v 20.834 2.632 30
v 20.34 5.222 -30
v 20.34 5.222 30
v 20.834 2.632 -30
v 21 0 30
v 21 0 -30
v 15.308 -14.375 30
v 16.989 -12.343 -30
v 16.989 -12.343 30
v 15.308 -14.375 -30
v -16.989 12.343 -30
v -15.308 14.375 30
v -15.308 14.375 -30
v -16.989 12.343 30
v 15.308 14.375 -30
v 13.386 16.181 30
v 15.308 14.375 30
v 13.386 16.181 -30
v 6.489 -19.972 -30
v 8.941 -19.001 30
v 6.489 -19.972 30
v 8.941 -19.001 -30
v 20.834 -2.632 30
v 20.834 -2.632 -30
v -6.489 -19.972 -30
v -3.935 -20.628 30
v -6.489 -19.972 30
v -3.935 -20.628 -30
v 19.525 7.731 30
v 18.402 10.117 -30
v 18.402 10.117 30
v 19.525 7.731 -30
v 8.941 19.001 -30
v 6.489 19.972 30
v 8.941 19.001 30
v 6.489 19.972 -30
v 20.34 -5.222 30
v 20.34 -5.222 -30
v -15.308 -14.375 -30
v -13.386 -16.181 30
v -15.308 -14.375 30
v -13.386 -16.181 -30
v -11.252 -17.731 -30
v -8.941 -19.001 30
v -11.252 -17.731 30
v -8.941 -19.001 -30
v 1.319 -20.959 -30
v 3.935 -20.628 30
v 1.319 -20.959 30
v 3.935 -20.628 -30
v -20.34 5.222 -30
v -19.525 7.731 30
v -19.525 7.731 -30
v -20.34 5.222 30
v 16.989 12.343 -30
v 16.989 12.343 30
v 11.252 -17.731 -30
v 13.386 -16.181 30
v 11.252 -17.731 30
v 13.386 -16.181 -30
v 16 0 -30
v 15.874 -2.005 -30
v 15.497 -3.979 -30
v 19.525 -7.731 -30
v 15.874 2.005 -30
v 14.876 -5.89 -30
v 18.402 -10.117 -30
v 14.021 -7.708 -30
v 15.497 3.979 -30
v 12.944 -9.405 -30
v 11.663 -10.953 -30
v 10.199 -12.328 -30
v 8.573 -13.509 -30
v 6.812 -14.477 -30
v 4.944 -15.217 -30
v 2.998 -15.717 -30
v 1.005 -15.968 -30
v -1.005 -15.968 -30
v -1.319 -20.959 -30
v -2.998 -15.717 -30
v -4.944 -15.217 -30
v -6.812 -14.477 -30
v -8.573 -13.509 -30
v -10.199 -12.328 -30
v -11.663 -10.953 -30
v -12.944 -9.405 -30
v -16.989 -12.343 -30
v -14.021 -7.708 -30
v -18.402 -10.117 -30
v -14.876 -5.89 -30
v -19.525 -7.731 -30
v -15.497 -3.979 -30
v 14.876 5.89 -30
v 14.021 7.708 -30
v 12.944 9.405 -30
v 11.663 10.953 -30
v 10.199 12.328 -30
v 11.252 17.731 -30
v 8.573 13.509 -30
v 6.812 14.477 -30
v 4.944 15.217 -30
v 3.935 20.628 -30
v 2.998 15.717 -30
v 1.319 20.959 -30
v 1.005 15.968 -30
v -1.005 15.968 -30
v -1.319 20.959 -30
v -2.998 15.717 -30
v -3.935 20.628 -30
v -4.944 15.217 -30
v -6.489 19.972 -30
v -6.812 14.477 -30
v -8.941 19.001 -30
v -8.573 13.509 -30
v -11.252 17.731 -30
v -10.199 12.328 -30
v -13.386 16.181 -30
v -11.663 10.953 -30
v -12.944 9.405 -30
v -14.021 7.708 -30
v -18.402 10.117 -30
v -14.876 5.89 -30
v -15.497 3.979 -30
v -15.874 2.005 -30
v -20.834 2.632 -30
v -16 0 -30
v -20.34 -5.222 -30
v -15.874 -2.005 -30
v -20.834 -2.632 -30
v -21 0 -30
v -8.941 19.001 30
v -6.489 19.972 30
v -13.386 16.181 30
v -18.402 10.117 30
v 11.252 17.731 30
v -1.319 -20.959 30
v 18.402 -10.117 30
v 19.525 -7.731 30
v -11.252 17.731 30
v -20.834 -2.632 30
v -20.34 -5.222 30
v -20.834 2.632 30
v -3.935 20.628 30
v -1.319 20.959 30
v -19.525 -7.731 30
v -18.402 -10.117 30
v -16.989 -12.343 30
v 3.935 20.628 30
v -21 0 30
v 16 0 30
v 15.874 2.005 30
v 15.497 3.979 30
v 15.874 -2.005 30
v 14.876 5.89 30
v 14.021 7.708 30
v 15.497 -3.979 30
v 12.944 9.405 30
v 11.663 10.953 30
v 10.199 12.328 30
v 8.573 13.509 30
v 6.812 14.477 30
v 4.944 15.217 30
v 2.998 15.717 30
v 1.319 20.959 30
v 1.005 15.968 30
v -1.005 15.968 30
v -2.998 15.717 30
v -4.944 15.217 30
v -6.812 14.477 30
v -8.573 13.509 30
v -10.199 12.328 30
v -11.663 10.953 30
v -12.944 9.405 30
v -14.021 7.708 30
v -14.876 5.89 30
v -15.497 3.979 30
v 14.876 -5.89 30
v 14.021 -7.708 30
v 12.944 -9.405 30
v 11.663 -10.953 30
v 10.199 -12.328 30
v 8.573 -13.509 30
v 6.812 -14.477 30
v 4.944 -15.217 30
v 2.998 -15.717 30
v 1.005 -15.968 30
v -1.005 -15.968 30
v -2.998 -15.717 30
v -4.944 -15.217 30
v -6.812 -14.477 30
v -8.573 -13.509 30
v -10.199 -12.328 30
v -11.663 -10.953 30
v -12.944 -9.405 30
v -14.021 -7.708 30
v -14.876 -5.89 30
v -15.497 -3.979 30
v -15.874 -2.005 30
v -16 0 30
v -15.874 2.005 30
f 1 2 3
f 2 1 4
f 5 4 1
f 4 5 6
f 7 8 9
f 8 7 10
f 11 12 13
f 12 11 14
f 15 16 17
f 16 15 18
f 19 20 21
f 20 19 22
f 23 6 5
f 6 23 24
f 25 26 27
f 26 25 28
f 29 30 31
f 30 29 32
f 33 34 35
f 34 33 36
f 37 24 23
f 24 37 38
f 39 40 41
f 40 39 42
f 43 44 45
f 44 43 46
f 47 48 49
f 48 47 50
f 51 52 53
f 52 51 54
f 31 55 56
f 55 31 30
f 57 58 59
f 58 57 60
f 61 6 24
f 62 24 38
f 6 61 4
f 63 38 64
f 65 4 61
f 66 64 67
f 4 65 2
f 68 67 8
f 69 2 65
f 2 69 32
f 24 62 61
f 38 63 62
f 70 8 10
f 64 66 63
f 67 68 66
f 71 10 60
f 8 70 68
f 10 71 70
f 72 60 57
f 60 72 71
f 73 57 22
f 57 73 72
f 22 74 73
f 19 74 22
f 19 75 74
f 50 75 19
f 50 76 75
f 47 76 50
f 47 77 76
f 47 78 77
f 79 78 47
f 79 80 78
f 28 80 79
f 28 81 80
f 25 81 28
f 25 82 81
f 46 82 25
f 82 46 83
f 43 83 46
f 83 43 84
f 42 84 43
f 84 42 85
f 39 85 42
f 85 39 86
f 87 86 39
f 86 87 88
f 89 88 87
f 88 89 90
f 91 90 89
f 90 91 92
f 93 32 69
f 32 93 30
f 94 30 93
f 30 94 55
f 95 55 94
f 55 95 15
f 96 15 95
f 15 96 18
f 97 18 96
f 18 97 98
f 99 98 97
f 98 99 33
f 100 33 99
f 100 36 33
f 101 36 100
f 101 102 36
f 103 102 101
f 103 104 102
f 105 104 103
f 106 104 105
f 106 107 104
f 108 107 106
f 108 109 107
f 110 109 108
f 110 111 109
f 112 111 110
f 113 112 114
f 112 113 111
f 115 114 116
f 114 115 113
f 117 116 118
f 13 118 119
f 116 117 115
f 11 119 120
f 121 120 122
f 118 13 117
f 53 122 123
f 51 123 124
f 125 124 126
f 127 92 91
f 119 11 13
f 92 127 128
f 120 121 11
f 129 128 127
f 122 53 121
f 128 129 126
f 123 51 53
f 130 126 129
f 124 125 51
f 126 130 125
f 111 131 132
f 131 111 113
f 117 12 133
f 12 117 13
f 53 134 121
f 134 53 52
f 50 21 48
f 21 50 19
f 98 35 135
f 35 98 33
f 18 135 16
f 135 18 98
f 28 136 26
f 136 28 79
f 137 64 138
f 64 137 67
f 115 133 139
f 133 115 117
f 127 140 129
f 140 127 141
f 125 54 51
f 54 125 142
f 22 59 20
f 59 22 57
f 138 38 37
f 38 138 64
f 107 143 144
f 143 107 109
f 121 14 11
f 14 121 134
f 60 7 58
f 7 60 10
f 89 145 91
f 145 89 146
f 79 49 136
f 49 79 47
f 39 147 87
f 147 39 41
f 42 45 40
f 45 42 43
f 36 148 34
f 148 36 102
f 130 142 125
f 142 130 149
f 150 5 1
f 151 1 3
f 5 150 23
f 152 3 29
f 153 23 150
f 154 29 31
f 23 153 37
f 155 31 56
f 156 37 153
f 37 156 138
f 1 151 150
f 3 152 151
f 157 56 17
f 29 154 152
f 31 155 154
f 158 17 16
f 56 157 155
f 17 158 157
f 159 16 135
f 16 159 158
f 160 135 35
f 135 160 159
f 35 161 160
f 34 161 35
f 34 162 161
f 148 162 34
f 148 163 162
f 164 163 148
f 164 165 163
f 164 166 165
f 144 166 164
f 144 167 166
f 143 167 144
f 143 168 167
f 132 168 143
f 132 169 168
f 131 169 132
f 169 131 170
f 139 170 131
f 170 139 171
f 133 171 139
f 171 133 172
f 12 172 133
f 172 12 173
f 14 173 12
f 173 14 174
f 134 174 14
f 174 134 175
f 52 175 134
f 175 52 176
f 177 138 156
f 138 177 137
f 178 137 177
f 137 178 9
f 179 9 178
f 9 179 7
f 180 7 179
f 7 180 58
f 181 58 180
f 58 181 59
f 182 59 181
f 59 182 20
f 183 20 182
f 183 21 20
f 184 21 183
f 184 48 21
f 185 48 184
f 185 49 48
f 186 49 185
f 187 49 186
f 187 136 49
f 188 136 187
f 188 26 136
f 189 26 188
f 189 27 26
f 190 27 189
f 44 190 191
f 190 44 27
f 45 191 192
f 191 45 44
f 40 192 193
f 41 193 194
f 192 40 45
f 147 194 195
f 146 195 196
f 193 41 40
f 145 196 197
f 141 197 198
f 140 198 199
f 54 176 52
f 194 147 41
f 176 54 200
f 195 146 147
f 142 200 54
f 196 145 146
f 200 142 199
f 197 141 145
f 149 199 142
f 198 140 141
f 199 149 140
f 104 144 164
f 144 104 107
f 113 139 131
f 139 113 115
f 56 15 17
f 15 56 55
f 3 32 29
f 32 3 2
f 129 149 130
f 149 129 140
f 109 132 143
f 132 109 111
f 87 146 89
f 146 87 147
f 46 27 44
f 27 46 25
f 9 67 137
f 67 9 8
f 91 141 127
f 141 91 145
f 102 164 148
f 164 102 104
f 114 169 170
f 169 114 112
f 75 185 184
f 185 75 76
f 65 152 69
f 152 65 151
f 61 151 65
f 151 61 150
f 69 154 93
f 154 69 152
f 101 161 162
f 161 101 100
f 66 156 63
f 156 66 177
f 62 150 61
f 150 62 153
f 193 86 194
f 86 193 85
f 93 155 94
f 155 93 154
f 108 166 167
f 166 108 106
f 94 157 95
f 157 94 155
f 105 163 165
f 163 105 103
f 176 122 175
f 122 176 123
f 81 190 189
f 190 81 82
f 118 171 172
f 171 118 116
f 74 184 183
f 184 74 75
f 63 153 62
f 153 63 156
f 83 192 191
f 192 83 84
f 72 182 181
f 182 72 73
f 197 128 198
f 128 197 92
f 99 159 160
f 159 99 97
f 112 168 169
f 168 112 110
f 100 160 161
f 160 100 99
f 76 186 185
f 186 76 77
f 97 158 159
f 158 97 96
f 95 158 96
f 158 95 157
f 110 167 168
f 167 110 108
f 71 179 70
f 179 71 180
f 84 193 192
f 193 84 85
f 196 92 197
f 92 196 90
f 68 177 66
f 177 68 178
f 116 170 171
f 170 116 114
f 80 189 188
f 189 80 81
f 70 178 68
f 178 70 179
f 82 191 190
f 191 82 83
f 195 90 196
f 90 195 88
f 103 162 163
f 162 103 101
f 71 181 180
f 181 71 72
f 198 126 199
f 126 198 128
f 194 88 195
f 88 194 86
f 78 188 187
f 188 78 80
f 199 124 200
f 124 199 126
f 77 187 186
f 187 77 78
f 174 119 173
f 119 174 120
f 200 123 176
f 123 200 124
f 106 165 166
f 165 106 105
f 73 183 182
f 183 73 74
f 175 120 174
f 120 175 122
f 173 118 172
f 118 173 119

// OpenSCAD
// file: ../config/parameters.scad
// Global Chassis Dimensions
chassis_width = 720; //kies een veelvoud van 80  
chassis_length = 1040; //kies een veelvoud van 80

// --- Modulair Gatenpatroon (Grid) ---
grid_step = 40; // Universele stapgrootte voor alle gaten

// --- Bereiken (Ranges) voor de Robot Afmetingen ---
// Bereik voor de BREEDTE 
chassis_width_min = 560;
chassis_width_max = 800;
chassis_width_step = 80; // Stapgrootte voor instelbare breedte

// Bereik voor de LENGTE 
chassis_length_min = 720;
chassis_length_max = 1040;
chassis_length_step = 80; // Stapgrootte voor instelbare lengte

// Bereik voor de BASE PLATE 
base_length_min = 800;
base_length_max = 1280;
base_length_step = 80;

// Beam Profile (Purchased Part)
beam_profile = 40;
beam_thickness = 3;    
beam_length_1 = 1000;
beam_length_2 = 1280;

// Upright & Cover
base_plate_length = 1300;
connect_plate_thick = 5; 
upright_height = 500;
top_side_width = 60;
cover_thick = 5;
cover_clearance = 10;  
cover_overlap = 10;
cover_total_height = 530; 
hole_distance_cover = 30;

// Resolution & Preview
$fn = 60; 
exploded_view = false; 
explosion_dist = 800; 

// Motor & Wheel Data
tire_dia = 430;
tire_width = 100;
hub_dia = 160;
hub_width = 140; //specs from Quinder are: Fork width for mounting: 138mm
axle_dia = 10.2; //specs from Quinder are: Mounting hole: max 10.2mm
bolt_dia = 14.2;

// Bracket Geometry universal
bracket_thick = 5;
bracket_bolt_diameter = 10.4; //dikte van de gaten van gaten van de wiel_bracket     
tire_clearance = 130;      
side_plate_top_width = 240;
side_plate_width = 240;

//Side plate
axle_bottom_dist = 35;
extra_space_bracket = 40;
side_hole_start_from_bottom = 20; 
side_hole_pitch = 100; 

tab_length = 40;         // Lengte van de nok/sleuf
tab_offset_y = 40;       // Positie vanaf het midden over de Y-as (uit elkaar)
laser_tolerance = 0.5;   // Extra snijspeling zodat het makkelijk in elkaar schuift

//top plate
bracket_top_hole_dist_x = 80; // De totale gewenste afstand over de X-as
bracket_top_hole_dist_y = 120; // De totale gewenste afstand over de Y-as


arm_height = (tire_dia / 2) + tire_clearance;
inner_width = hub_width;
bracket_total_width = inner_width + (extra_space_bracket*2) + (2 * bracket_thick);
bracket_top_z = arm_height + bracket_thick;

// Axle bracket
axle_hex_width = 85;          
axle_hex_height = 40;
axle_hex_straight_part = 30;   
axle_bracket_thickness = 5;    

axle_hole_diameter = 10.3; //Dikte van het gaten in de axle_bracket
axle_hole_distance = 30; //hoogte vanaf de onderkant tot de wiel ophanging

axle_flat_width = axle_dia; // Gebruikt 10.2 uit parameters 
axle_round_dia = bolt_dia;  // Gebruikt 14.2 uit parameters

// --- Caster Wheel Parameters ---  
bracket_width            = 80;  
bracket_thickness        = 5;
caster_wheel_axle_width  = 130;   
caster_wheel_axle_diameter = 20;
bracket_axle_hole_diameter = 10.4;

pivot_cylinder_dia       = 30;  
pivot_cylinder_height    = 100;  

outer_cylinder_thickness = 5;   
outer_cylinder_height    = 60;  
outer_cylinder_z_offset  = 33;   
kap_speling              = 1;   

tube_width               = 35;  
tube_thickness           = 2;   
tube_length              = 400;
tube_length_min          = 240;
// main file
include <../config/parameters.scad>

module caster_wheel_outer_cilinder() {
    inner_hole_dia = pivot_cylinder_dia + (2 * kap_speling);
    outer_dia = inner_hole_dia + (2 * outer_cylinder_thickness);
    
    color("#993333") {
        difference() {
            cylinder(h=outer_cylinder_height, d=outer_dia, center=true, $fn=50);
            cylinder(h=outer_cylinder_height + 2, d=inner_hole_dia, center=true, $fn=50);
        }
    }
}

caster_wheel_outer_cilinder();
